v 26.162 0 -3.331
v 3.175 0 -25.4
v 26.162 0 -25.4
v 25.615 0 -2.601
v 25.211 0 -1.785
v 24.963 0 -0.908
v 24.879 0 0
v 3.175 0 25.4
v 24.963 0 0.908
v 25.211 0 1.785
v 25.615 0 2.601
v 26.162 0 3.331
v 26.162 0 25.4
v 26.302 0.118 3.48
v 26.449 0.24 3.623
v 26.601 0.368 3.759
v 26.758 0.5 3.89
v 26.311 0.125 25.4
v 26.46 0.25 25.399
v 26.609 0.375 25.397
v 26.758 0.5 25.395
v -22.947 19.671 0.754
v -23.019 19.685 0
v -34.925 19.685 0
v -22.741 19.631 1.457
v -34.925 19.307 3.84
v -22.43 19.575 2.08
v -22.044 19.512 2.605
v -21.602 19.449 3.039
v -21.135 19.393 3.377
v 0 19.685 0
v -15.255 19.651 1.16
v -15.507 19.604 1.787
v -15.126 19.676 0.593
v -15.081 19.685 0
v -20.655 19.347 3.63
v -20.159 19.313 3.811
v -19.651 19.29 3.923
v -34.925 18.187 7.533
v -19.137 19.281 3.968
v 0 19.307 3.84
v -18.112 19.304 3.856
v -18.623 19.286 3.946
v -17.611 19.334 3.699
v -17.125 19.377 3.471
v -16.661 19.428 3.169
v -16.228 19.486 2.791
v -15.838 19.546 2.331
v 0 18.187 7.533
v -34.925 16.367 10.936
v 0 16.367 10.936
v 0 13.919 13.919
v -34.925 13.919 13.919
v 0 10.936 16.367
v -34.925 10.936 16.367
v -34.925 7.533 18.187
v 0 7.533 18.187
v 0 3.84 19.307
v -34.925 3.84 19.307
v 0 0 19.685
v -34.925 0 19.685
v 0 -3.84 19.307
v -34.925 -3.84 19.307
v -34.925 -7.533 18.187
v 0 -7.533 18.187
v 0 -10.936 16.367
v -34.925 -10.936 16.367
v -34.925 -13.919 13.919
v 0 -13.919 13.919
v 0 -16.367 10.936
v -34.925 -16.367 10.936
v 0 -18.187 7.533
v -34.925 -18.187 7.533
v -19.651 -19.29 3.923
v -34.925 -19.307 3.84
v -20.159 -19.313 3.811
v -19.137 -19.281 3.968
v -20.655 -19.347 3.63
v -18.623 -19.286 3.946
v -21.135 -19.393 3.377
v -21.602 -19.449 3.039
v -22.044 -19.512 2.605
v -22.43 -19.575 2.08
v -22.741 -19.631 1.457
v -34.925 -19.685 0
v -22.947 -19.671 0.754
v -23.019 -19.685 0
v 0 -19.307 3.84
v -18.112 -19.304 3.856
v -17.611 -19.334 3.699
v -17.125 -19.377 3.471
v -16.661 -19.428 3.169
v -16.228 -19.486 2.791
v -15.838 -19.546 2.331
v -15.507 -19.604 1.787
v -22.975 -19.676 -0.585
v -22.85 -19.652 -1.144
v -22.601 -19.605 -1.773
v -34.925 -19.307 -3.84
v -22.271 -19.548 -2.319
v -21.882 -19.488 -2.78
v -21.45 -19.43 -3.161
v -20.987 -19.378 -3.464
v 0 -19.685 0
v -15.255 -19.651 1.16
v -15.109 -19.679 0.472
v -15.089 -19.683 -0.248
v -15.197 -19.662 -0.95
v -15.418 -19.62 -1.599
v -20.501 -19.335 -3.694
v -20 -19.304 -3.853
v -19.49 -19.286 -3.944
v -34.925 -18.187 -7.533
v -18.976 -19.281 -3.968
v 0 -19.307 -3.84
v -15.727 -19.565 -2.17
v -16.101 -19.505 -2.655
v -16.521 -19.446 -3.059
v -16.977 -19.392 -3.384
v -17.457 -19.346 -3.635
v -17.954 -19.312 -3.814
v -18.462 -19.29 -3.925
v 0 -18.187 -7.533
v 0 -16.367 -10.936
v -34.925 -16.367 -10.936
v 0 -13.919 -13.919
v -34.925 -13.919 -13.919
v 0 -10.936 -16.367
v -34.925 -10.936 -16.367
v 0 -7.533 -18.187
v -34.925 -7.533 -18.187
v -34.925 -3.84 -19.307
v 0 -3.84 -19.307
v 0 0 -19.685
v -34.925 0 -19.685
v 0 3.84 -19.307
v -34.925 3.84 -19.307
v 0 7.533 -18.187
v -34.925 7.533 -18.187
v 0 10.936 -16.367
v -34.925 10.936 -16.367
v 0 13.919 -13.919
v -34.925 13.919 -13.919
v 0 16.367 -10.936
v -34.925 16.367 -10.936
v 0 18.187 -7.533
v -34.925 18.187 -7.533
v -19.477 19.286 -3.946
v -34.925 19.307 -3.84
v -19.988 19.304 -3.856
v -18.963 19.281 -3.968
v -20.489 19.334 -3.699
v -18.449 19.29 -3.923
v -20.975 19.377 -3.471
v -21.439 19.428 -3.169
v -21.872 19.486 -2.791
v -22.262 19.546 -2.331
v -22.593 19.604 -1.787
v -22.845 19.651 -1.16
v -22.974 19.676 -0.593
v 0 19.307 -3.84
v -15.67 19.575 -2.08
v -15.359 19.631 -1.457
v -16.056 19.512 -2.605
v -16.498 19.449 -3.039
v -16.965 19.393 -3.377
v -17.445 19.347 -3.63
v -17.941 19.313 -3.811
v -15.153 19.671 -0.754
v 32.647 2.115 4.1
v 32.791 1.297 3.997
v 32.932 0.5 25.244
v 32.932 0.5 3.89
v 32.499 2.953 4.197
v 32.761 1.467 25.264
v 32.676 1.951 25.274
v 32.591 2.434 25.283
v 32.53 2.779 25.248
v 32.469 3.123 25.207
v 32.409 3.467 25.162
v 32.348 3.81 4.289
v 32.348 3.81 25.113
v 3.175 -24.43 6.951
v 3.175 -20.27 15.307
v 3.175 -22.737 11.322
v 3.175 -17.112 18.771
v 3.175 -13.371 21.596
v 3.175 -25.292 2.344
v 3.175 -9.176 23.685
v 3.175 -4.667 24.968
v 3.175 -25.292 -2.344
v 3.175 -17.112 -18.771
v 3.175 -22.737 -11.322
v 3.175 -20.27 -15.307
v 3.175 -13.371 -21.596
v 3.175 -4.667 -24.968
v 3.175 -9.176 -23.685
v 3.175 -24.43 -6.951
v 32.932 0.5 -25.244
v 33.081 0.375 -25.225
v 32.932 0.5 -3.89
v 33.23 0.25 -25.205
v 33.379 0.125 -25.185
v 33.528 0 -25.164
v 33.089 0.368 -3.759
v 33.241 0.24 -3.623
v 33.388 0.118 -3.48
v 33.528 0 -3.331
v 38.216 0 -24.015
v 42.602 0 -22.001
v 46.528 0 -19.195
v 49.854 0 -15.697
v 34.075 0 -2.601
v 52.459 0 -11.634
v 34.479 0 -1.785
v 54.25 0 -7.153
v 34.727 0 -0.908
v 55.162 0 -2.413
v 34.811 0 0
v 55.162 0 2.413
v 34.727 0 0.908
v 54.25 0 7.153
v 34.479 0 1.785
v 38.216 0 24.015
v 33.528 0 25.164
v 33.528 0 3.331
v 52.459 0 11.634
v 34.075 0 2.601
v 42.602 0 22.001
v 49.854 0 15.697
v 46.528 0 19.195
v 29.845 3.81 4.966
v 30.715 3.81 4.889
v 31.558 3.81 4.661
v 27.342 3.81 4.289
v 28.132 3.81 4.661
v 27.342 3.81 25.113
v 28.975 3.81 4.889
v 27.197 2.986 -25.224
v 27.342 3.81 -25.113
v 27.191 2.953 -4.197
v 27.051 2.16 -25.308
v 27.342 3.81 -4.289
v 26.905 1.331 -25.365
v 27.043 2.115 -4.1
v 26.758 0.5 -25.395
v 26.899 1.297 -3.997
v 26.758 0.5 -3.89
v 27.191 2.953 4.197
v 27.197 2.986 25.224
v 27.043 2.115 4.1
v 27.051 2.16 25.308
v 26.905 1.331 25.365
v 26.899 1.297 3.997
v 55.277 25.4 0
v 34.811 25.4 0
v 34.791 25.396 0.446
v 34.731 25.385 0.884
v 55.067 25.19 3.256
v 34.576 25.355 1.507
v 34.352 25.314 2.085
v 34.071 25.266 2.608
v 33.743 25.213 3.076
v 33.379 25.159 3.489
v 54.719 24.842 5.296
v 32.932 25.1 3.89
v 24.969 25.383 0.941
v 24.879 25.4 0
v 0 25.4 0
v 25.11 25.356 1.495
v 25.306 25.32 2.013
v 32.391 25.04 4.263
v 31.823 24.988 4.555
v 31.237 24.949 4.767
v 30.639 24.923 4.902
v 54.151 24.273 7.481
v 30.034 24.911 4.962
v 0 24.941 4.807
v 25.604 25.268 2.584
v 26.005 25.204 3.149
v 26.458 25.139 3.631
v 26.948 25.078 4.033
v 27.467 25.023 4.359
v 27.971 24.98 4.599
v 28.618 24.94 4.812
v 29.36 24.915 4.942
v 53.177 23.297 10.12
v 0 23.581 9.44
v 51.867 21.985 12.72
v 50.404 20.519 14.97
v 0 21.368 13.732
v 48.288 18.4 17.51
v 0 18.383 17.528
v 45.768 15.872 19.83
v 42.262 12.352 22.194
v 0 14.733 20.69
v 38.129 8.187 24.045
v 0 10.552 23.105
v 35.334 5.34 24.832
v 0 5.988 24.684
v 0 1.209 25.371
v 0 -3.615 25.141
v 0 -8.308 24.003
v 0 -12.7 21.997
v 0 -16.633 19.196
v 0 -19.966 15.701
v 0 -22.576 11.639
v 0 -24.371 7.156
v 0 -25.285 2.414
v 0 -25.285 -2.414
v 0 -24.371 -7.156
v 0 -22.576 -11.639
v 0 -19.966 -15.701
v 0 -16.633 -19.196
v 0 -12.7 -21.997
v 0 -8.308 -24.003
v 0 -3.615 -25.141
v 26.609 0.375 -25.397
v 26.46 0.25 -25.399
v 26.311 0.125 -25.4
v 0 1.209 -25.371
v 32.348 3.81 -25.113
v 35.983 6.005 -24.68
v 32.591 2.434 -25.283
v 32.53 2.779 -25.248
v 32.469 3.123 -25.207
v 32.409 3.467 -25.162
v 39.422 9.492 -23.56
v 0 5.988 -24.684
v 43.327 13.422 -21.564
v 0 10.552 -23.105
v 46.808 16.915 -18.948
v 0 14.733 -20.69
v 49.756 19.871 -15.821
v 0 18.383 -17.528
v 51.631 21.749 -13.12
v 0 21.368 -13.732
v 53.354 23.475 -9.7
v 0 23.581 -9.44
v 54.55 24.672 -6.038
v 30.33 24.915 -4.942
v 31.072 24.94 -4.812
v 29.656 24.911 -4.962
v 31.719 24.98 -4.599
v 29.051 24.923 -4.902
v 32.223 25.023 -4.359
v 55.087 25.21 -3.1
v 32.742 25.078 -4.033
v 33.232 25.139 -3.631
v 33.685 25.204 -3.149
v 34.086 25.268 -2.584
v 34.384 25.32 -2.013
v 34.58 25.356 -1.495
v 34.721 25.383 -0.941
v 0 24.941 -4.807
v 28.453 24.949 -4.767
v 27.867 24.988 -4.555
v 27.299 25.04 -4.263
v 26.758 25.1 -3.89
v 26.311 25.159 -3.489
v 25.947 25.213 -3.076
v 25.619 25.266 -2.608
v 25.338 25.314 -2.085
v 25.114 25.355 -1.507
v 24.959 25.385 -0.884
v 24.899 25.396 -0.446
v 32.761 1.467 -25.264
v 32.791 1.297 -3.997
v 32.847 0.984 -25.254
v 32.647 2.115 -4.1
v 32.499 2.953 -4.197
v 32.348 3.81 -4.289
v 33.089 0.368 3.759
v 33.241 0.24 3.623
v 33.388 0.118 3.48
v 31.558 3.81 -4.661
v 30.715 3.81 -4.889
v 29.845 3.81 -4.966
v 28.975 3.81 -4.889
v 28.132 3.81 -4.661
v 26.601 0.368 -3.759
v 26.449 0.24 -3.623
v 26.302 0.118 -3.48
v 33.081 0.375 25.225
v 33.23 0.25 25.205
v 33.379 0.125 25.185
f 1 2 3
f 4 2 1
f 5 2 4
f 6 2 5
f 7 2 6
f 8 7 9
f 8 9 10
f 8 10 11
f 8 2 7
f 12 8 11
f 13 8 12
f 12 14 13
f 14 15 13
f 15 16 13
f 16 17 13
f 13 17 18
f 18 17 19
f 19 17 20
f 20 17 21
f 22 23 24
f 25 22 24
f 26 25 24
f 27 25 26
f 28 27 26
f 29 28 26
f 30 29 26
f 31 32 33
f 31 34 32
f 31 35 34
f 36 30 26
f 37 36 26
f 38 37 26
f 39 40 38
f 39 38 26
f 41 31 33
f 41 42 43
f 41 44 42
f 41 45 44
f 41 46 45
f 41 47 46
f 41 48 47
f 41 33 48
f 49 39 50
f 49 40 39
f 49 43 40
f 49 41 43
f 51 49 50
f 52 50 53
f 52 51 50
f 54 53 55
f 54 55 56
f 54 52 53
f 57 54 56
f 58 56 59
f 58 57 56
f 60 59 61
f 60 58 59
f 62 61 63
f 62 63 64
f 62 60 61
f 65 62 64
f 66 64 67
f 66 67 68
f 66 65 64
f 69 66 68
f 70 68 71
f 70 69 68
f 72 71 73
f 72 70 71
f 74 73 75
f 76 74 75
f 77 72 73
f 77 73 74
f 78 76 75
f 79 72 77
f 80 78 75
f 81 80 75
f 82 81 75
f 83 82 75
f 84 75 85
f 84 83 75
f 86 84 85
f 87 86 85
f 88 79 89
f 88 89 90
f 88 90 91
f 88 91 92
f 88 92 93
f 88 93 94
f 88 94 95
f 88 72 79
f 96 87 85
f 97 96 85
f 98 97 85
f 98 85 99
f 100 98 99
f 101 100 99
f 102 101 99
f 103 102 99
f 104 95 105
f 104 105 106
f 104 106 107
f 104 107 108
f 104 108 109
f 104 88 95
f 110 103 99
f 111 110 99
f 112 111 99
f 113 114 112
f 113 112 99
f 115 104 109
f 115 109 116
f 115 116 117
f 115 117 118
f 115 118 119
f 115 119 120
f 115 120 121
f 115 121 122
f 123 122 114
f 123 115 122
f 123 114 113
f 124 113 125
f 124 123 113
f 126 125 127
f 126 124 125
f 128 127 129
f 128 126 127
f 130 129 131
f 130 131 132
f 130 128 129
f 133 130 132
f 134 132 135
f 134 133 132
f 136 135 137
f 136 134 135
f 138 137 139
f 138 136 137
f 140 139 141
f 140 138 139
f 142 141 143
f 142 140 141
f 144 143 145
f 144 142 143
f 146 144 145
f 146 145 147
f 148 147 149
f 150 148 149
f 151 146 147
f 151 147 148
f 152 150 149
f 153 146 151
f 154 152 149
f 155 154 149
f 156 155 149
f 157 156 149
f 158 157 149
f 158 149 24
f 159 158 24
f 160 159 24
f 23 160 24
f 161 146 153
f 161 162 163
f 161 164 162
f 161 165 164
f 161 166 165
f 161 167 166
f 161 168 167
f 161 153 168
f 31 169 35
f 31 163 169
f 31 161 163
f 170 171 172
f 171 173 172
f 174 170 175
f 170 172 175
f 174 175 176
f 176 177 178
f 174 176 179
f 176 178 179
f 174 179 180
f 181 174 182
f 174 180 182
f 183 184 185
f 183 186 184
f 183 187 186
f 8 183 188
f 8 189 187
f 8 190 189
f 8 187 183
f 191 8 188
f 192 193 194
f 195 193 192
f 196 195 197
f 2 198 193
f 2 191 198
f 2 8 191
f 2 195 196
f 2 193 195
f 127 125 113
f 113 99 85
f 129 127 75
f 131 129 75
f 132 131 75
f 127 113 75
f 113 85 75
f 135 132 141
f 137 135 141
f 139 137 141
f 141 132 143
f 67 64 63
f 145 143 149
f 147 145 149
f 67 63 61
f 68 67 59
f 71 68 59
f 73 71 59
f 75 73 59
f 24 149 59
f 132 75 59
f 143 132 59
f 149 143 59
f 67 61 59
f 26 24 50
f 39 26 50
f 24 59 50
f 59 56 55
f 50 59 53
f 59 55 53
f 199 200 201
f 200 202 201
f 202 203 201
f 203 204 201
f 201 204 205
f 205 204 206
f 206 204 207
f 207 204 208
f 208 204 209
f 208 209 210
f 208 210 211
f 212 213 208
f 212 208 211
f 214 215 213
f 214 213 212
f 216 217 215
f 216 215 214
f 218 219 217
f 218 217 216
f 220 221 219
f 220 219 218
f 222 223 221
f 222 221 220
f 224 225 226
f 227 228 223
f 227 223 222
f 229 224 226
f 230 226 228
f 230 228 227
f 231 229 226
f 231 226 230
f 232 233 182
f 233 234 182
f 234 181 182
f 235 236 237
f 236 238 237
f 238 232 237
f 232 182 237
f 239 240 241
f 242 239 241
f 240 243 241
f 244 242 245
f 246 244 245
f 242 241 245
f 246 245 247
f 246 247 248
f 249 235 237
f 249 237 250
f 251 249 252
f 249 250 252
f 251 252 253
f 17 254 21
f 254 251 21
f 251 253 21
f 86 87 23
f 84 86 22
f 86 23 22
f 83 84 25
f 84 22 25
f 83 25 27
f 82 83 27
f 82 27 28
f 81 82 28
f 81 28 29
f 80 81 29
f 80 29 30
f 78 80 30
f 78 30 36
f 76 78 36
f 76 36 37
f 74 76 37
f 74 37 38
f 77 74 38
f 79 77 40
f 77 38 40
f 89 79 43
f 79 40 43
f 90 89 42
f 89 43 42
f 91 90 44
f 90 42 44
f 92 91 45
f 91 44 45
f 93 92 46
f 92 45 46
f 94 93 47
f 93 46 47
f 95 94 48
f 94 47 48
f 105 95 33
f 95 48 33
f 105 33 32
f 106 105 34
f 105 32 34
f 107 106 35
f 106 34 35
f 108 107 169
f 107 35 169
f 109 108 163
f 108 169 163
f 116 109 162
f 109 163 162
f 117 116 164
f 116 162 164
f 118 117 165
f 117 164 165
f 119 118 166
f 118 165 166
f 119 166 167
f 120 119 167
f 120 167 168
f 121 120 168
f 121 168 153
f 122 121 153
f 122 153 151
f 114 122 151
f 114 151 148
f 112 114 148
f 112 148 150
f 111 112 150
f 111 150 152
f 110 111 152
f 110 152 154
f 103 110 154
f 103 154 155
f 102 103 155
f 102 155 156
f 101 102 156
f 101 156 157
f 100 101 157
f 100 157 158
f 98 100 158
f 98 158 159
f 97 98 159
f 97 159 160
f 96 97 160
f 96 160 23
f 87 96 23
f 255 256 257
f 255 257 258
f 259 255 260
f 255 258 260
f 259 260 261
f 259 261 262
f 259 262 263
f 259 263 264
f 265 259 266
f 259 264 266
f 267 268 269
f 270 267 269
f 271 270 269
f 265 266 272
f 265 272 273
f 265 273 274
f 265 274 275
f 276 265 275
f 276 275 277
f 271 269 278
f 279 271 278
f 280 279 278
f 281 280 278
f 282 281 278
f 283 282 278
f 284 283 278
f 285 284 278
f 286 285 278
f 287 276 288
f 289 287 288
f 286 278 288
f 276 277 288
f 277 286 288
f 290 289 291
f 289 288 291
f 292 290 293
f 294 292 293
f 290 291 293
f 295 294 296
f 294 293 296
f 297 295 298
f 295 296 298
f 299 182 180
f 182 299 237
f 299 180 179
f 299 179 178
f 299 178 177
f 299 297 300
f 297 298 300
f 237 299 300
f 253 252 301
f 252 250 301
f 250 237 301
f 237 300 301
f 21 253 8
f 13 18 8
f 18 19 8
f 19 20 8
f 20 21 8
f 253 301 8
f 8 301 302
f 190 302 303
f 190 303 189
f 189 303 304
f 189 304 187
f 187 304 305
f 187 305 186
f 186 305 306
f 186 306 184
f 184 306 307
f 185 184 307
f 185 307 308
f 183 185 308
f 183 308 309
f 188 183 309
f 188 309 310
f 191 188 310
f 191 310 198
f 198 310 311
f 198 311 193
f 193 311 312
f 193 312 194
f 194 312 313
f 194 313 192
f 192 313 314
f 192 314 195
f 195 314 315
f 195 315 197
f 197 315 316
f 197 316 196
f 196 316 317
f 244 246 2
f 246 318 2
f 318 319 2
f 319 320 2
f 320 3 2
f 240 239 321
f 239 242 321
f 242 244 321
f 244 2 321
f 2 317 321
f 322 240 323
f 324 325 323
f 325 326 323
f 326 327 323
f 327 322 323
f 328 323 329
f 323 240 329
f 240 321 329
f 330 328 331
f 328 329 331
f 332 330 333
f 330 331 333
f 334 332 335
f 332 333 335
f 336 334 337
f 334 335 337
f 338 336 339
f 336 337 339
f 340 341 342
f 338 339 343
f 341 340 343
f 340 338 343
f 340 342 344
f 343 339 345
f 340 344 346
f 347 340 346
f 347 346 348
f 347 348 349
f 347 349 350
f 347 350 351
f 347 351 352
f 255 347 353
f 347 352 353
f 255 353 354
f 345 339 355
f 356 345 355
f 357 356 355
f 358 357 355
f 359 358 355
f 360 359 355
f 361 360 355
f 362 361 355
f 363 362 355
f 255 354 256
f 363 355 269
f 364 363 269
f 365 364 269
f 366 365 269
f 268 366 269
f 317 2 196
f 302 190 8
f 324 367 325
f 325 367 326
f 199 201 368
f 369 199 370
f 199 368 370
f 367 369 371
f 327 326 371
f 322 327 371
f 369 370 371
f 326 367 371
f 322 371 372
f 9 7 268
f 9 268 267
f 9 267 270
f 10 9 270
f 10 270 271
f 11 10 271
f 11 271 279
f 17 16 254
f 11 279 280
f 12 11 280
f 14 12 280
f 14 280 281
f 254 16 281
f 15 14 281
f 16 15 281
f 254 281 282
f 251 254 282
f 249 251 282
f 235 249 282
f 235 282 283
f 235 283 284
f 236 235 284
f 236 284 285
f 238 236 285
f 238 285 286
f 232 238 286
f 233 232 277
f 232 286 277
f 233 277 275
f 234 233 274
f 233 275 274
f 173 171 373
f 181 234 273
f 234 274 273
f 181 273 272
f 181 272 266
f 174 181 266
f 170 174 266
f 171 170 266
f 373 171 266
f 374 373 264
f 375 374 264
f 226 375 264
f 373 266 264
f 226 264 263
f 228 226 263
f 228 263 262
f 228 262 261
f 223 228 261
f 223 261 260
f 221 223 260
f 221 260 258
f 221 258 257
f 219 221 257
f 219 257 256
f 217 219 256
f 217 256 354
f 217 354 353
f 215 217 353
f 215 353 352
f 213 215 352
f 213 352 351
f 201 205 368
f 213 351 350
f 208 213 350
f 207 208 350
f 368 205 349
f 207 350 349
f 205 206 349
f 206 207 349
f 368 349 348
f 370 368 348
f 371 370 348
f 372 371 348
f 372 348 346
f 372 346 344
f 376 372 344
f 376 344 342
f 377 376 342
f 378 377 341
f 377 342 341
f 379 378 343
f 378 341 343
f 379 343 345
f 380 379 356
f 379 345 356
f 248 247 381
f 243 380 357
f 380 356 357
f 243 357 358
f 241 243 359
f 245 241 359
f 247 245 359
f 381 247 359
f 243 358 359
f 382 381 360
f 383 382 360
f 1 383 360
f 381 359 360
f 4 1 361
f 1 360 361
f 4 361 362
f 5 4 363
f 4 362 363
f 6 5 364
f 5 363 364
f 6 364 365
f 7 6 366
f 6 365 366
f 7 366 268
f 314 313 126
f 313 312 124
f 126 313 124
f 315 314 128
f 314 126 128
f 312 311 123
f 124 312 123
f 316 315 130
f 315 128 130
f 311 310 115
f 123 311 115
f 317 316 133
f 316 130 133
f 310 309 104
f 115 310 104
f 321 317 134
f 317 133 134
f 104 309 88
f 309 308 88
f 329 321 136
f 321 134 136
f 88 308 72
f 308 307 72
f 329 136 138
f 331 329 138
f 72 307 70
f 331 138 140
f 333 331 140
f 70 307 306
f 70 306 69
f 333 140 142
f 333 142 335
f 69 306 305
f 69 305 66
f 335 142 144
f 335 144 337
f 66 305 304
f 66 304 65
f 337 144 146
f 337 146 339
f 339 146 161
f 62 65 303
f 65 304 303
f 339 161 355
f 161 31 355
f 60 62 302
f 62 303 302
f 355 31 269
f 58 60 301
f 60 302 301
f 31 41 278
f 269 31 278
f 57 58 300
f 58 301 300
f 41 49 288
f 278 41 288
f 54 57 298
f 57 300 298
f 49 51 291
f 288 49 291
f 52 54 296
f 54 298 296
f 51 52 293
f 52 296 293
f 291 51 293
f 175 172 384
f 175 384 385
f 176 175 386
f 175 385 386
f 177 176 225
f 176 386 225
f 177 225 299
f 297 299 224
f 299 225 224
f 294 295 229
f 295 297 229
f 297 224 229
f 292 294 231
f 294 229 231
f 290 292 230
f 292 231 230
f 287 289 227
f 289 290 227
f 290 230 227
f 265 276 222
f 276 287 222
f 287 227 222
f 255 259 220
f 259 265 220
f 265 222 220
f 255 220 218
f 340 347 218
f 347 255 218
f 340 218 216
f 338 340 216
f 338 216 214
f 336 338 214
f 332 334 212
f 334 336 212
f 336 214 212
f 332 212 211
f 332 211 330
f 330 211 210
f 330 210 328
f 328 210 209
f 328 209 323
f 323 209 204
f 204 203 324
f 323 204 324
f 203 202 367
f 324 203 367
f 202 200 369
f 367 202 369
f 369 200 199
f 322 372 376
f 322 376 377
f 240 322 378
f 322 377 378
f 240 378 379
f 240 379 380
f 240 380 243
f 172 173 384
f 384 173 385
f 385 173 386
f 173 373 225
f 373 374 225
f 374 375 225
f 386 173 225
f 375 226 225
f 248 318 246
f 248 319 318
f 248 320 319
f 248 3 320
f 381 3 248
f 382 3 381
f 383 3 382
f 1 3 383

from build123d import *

# Parameters (mm, degrees)
F0_R      = 25.4
F1_DEPTH  = 3.175
F2_R      = 19.685
F3_DEPTH  = 38.1
F4_R      = 25.4
F5_DEPTH  = 58.42
F7_DEPTH  = 25.401
F10_D     = 9.9314
F12_DEPTH = 25.4
F15_DEPTH = 50.8010001
F16_SIZE  = 0.508
F18_D     = 7.9375


with BuildPart() as f1:
    # F0 (on Right) → F1 (new body)
    with BuildSketch(Plane.YZ):
        Circle(F0_R)
    extrude(amount=F1_DEPTH)

    # F2 (on face) → F3 (join)
    with BuildSketch(Plane.YZ.offset(3.175)):
        Circle(F2_R)
    extrude(amount=-F3_DEPTH)

    # F4 (on Right) → F5 (join)
    with BuildSketch(Plane.YZ):
        Circle(F4_R)
    extrude(amount=F5_DEPTH)

    # F6 (on Front) → F7 (cut, through all)
    with BuildSketch(Plane.XZ):
        Polygon((50.8, 25.4), (3.175, 25.4), (3.175, -25.4), (58.42, -25.4), (58.42, 25.4), align=None)
    extrude(amount=F7_DEPTH, mode=Mode.SUBTRACT)

    # F10 (through all)
    with Locations(Plane.XZ):
        with Locations((29.845, 0)):
            Hole(F10_D / 2)

    # F11 (on Top) → F12 (cut, symmetric)
    with BuildSketch(Plane.XY):
        Polygon((27.3418057965, 3.81), (26.67, 0), (33.02, 0), (32.3481942035, 3.81), align=None)
    extrude(amount=F12_DEPTH, both=True, mode=Mode.SUBTRACT)

    # F14 (on offset) → F15 (cut, through all)
    with BuildSketch(Plane.XZ.offset(25.4)):
        with BuildLine():
            ThreePointArc((29.845, 25.431730181), (55.276730181, 0), (29.845, -25.431730181))
            Line((29.845, -25.431730181), (29.845, -32.23392232))
            Line((29.845, -32.23392232), (58.42, -32.23392232))
            Line((58.42, -32.23392232), (58.42, 32.23392232))
            Line((58.42, 32.23392232), (29.845, 32.23392232))
            Line((29.845, 32.23392232), (29.845, 25.431730181))
        make_face()
    extrude(amount=-F15_DEPTH, mode=Mode.SUBTRACT)

    # F16
    f16_edges = [f1.edges().sort_by_distance(p)[0] for p in [
        (26.67, 0, -14.609028),
        (26.67, 0, 14.609028),
        (33.02, 0, -14.525409),
        (33.02, 0, 14.525409),
    ]]
    chamfer(f16_edges, length=F16_SIZE)

    # F18 (through all)
    with Locations(Plane.XZ.offset(25.4)):
        with Locations((-19.05, 0)):
            Hole(F18_D / 2)


solid = f1.part
